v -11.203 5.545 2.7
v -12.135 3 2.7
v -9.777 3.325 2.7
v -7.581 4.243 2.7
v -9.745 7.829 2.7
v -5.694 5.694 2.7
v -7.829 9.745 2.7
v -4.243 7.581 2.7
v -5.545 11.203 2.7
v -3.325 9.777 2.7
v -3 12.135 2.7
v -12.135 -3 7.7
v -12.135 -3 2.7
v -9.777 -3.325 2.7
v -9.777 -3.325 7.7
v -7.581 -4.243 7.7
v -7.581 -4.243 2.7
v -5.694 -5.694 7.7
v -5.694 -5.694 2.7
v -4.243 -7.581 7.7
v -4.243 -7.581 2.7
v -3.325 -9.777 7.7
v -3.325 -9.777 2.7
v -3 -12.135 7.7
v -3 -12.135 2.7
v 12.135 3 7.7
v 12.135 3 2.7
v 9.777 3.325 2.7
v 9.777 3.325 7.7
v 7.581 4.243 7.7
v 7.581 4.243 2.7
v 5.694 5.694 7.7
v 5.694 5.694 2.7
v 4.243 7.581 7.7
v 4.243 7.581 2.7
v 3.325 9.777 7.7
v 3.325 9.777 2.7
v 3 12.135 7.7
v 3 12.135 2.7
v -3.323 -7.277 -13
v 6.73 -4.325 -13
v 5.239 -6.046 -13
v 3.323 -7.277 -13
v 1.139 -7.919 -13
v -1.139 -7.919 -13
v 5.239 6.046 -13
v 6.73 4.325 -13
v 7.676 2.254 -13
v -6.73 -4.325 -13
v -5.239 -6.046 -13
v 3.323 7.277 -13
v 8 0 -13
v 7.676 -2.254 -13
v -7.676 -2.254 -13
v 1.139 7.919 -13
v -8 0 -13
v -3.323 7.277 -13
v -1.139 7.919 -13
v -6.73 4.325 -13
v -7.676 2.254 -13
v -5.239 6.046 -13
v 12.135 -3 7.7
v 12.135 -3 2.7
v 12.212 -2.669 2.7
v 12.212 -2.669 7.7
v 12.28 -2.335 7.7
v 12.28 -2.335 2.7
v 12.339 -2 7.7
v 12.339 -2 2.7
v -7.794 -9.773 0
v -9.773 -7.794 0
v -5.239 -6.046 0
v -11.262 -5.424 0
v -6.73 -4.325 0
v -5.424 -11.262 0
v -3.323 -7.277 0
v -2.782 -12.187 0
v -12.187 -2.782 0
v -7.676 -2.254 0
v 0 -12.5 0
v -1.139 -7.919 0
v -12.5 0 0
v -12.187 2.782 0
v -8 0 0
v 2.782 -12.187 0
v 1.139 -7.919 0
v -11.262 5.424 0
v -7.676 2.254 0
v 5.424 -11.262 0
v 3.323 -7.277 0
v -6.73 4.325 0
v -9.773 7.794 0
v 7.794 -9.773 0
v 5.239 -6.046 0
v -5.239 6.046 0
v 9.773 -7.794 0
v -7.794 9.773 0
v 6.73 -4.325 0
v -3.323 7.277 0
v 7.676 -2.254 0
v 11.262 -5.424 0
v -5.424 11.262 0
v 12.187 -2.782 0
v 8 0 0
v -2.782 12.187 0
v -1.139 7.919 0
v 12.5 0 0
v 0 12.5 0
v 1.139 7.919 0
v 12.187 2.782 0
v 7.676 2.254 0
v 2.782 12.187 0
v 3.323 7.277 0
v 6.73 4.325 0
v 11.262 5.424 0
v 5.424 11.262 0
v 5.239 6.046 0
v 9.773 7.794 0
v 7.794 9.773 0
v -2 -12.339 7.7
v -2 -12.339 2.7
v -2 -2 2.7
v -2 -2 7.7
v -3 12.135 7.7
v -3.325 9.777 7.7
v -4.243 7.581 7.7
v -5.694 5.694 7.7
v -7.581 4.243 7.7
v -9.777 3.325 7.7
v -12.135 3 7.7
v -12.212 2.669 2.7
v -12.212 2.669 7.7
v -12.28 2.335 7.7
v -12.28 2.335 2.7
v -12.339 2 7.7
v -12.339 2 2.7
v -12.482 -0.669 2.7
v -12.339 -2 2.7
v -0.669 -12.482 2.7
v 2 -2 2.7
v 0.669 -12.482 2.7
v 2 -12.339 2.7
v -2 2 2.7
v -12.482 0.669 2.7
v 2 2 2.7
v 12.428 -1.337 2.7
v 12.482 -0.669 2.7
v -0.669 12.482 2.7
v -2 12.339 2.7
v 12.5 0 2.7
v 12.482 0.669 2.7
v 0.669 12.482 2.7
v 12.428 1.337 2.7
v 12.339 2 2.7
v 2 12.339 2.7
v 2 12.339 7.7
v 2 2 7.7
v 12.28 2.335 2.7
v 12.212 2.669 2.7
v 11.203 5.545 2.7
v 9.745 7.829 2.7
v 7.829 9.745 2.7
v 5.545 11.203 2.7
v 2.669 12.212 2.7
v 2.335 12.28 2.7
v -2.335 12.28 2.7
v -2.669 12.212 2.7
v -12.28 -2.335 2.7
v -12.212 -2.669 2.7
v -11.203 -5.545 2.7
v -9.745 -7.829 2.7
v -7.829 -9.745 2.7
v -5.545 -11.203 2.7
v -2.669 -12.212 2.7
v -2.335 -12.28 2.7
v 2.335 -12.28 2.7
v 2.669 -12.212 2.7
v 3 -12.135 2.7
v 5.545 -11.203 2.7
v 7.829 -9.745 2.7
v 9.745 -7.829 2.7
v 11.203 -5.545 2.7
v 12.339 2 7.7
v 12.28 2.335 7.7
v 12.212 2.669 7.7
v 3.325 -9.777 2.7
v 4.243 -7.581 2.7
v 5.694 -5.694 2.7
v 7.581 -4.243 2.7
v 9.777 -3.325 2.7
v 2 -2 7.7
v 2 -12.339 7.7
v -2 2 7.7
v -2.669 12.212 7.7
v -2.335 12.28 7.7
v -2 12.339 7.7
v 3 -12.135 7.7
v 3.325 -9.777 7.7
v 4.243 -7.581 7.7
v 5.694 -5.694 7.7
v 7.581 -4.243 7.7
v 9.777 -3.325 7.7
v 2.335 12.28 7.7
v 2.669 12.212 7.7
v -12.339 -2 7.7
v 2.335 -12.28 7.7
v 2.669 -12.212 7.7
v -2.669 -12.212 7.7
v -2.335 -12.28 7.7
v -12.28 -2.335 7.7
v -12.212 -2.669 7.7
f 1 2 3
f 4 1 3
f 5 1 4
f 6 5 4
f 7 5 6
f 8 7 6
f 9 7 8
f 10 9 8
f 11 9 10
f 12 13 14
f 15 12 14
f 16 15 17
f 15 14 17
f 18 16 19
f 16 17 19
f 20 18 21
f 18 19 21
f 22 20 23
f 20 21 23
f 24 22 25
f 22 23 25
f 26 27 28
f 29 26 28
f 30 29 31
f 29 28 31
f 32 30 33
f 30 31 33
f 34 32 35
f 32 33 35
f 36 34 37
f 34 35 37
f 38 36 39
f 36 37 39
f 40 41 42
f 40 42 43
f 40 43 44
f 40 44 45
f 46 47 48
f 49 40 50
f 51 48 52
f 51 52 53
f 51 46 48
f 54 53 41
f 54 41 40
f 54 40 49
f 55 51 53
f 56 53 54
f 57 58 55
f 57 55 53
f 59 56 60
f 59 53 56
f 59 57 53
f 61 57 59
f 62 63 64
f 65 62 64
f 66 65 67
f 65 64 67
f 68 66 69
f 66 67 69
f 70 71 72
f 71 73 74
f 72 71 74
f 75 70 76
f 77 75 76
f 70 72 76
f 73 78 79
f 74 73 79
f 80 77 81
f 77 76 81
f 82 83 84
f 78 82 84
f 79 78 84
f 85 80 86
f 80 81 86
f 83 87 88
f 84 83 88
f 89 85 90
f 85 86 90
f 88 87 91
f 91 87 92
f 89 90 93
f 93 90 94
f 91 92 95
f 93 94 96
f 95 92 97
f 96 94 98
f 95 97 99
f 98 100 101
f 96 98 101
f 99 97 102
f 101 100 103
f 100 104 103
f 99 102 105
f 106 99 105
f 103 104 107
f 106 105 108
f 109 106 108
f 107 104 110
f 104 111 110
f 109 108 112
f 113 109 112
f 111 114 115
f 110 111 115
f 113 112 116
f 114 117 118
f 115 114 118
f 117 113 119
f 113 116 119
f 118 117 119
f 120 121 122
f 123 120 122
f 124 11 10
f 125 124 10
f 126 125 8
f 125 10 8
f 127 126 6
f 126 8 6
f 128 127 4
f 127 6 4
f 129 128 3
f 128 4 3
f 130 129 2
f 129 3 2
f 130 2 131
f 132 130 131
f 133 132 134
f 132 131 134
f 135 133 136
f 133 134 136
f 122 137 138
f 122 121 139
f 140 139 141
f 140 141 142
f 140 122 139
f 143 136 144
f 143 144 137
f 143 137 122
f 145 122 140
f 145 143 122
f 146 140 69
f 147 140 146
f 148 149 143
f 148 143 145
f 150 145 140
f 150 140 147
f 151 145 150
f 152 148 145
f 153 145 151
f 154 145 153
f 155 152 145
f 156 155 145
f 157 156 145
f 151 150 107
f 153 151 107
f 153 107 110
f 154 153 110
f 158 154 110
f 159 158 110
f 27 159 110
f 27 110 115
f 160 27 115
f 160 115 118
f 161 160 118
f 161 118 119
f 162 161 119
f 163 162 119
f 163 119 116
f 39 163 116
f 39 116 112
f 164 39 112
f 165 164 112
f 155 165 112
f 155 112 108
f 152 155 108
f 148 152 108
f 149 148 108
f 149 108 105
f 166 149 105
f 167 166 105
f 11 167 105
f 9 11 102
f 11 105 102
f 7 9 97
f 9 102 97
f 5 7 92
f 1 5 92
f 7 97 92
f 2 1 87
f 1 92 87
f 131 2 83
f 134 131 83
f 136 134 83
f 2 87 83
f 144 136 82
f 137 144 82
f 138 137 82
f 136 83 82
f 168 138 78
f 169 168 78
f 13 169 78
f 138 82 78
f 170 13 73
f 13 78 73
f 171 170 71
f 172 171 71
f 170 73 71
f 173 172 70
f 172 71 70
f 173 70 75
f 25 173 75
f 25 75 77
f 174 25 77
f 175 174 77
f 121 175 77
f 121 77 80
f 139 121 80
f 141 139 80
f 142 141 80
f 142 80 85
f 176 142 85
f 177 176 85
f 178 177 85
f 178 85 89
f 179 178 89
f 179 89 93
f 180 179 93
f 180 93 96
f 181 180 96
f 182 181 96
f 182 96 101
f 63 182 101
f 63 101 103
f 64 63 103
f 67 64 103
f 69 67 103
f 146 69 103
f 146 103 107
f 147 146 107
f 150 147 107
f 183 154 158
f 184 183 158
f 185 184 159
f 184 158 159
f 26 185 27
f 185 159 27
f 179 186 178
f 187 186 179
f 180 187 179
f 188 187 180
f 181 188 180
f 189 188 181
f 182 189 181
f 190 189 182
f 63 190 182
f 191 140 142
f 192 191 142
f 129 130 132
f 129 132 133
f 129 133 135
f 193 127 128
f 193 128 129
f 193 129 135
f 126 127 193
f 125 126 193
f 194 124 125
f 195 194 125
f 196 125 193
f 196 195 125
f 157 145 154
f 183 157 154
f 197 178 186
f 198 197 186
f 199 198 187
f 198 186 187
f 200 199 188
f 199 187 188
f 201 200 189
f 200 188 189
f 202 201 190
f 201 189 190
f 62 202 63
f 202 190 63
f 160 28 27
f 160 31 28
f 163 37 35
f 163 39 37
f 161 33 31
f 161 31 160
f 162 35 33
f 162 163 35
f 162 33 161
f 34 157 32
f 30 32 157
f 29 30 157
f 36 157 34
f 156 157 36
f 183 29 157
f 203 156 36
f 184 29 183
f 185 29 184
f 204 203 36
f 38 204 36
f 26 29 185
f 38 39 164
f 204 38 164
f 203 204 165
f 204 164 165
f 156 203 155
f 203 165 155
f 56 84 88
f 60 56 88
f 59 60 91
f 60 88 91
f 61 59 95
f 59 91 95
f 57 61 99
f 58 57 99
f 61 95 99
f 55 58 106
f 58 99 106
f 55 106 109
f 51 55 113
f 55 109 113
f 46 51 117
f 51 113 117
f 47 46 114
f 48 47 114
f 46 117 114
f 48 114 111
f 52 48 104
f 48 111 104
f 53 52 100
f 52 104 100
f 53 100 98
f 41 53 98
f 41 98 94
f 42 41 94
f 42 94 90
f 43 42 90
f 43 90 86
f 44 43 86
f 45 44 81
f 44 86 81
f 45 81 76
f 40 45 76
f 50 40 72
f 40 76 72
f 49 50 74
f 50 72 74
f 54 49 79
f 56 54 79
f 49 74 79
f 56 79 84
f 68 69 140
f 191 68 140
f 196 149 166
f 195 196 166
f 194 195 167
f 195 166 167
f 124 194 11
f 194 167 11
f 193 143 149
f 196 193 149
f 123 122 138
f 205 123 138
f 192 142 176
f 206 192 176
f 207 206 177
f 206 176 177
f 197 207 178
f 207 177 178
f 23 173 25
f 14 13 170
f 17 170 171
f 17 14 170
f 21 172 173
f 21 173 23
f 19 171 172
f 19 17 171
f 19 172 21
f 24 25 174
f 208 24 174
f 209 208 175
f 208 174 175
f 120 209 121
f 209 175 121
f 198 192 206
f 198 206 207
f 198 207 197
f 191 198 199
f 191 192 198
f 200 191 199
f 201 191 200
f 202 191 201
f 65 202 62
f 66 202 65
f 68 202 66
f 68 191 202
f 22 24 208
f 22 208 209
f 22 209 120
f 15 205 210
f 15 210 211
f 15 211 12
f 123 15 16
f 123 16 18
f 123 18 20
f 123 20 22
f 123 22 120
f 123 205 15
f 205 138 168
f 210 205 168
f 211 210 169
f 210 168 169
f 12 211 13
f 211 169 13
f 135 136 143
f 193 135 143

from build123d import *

# Parameters (mm, degrees)
CROQUIS1_R              = 12.5
SALIENTE_EXTRUIR1_DEPTH = 2.7
SALIENTE_EXTRUIR2_START = 2.7
SALIENTE_EXTRUIR2_DEPTH = 5
CROQUIS2_R              = 8
SALIENTE_EXTRUIR3_DEPTH = 13


with BuildPart() as part:
    # Croquis1 → Saliente-Extruir1 (new body)
    with BuildSketch(Plane.XY):
        Circle(CROQUIS1_R)
    extrude(amount=SALIENTE_EXTRUIR1_DEPTH)

    # Croquis1<3> → Saliente-Extruir2 (add)
    with BuildSketch(Plane.XY.offset(SALIENTE_EXTRUIR2_START)):
        with BuildLine():
            Line((-2, 2), (-2, 12.338962679))
            ThreePointArc((-2, 12.338962679), (-2.502086086, 12.247022708), (-3, 12.1346611))
            ThreePointArc((-3, 12.1346611), (-5.694387223, 5.694387223), (-12.1346611, 3))
            ThreePointArc((-12.1346611, 3), (-12.247022708, 2.502086086), (-12.338962679, 2))
            Line((-12.338962679, 2), (-2, 2))
        make_face()
        with BuildLine():
            ThreePointArc((3, 12.1346611), (2.502086086, 12.247022708), (2, 12.338962679))
            Line((2, 12.338962679), (2, 2))
            Line((2, 2), (12.338962679, 2))
            ThreePointArc((12.338962679, 2), (12.247022708, 2.502086086), (12.1346611, 3))
            ThreePointArc((12.1346611, 3), (5.694387223, 5.694387223), (3, 12.1346611))
        make_face()
        with BuildLine():
            Line((12.338962679, -2), (2, -2))
            Line((2, -2), (2, -12.338962679))
            ThreePointArc((2, -12.338962679), (2.502086086, -12.247022708), (3, -12.1346611))
            ThreePointArc((3, -12.1346611), (5.694387223, -5.694387223), (12.1346611, -3))
            ThreePointArc((12.1346611, -3), (12.247022708, -2.502086086), (12.338962679, -2))
        make_face()
        with BuildLine():
            Line((-2, -12.338962679), (-2, -2))
            Line((-2, -2), (-12.338962679, -2))
            ThreePointArc((-12.338962679, -2), (-12.247022708, -2.502086086), (-12.1346611, -3))
            ThreePointArc((-12.1346611, -3), (-5.694387223, -5.694387223), (-3, -12.1346611))
            ThreePointArc((-3, -12.1346611), (-2.502086086, -12.247022708), (-2, -12.338962679))
        make_face()
    extrude(amount=SALIENTE_EXTRUIR2_DEPTH)

    # Croquis2 → Saliente-Extruir3 (add)
    with BuildSketch(Plane(origin=(0, 0, 0), x_dir=(-1, 0, 0), z_dir=(0, 0, -1))):
        Circle(CROQUIS2_R)
    extrude(amount=SALIENTE_EXTRUIR3_DEPTH)


solid = part.part
